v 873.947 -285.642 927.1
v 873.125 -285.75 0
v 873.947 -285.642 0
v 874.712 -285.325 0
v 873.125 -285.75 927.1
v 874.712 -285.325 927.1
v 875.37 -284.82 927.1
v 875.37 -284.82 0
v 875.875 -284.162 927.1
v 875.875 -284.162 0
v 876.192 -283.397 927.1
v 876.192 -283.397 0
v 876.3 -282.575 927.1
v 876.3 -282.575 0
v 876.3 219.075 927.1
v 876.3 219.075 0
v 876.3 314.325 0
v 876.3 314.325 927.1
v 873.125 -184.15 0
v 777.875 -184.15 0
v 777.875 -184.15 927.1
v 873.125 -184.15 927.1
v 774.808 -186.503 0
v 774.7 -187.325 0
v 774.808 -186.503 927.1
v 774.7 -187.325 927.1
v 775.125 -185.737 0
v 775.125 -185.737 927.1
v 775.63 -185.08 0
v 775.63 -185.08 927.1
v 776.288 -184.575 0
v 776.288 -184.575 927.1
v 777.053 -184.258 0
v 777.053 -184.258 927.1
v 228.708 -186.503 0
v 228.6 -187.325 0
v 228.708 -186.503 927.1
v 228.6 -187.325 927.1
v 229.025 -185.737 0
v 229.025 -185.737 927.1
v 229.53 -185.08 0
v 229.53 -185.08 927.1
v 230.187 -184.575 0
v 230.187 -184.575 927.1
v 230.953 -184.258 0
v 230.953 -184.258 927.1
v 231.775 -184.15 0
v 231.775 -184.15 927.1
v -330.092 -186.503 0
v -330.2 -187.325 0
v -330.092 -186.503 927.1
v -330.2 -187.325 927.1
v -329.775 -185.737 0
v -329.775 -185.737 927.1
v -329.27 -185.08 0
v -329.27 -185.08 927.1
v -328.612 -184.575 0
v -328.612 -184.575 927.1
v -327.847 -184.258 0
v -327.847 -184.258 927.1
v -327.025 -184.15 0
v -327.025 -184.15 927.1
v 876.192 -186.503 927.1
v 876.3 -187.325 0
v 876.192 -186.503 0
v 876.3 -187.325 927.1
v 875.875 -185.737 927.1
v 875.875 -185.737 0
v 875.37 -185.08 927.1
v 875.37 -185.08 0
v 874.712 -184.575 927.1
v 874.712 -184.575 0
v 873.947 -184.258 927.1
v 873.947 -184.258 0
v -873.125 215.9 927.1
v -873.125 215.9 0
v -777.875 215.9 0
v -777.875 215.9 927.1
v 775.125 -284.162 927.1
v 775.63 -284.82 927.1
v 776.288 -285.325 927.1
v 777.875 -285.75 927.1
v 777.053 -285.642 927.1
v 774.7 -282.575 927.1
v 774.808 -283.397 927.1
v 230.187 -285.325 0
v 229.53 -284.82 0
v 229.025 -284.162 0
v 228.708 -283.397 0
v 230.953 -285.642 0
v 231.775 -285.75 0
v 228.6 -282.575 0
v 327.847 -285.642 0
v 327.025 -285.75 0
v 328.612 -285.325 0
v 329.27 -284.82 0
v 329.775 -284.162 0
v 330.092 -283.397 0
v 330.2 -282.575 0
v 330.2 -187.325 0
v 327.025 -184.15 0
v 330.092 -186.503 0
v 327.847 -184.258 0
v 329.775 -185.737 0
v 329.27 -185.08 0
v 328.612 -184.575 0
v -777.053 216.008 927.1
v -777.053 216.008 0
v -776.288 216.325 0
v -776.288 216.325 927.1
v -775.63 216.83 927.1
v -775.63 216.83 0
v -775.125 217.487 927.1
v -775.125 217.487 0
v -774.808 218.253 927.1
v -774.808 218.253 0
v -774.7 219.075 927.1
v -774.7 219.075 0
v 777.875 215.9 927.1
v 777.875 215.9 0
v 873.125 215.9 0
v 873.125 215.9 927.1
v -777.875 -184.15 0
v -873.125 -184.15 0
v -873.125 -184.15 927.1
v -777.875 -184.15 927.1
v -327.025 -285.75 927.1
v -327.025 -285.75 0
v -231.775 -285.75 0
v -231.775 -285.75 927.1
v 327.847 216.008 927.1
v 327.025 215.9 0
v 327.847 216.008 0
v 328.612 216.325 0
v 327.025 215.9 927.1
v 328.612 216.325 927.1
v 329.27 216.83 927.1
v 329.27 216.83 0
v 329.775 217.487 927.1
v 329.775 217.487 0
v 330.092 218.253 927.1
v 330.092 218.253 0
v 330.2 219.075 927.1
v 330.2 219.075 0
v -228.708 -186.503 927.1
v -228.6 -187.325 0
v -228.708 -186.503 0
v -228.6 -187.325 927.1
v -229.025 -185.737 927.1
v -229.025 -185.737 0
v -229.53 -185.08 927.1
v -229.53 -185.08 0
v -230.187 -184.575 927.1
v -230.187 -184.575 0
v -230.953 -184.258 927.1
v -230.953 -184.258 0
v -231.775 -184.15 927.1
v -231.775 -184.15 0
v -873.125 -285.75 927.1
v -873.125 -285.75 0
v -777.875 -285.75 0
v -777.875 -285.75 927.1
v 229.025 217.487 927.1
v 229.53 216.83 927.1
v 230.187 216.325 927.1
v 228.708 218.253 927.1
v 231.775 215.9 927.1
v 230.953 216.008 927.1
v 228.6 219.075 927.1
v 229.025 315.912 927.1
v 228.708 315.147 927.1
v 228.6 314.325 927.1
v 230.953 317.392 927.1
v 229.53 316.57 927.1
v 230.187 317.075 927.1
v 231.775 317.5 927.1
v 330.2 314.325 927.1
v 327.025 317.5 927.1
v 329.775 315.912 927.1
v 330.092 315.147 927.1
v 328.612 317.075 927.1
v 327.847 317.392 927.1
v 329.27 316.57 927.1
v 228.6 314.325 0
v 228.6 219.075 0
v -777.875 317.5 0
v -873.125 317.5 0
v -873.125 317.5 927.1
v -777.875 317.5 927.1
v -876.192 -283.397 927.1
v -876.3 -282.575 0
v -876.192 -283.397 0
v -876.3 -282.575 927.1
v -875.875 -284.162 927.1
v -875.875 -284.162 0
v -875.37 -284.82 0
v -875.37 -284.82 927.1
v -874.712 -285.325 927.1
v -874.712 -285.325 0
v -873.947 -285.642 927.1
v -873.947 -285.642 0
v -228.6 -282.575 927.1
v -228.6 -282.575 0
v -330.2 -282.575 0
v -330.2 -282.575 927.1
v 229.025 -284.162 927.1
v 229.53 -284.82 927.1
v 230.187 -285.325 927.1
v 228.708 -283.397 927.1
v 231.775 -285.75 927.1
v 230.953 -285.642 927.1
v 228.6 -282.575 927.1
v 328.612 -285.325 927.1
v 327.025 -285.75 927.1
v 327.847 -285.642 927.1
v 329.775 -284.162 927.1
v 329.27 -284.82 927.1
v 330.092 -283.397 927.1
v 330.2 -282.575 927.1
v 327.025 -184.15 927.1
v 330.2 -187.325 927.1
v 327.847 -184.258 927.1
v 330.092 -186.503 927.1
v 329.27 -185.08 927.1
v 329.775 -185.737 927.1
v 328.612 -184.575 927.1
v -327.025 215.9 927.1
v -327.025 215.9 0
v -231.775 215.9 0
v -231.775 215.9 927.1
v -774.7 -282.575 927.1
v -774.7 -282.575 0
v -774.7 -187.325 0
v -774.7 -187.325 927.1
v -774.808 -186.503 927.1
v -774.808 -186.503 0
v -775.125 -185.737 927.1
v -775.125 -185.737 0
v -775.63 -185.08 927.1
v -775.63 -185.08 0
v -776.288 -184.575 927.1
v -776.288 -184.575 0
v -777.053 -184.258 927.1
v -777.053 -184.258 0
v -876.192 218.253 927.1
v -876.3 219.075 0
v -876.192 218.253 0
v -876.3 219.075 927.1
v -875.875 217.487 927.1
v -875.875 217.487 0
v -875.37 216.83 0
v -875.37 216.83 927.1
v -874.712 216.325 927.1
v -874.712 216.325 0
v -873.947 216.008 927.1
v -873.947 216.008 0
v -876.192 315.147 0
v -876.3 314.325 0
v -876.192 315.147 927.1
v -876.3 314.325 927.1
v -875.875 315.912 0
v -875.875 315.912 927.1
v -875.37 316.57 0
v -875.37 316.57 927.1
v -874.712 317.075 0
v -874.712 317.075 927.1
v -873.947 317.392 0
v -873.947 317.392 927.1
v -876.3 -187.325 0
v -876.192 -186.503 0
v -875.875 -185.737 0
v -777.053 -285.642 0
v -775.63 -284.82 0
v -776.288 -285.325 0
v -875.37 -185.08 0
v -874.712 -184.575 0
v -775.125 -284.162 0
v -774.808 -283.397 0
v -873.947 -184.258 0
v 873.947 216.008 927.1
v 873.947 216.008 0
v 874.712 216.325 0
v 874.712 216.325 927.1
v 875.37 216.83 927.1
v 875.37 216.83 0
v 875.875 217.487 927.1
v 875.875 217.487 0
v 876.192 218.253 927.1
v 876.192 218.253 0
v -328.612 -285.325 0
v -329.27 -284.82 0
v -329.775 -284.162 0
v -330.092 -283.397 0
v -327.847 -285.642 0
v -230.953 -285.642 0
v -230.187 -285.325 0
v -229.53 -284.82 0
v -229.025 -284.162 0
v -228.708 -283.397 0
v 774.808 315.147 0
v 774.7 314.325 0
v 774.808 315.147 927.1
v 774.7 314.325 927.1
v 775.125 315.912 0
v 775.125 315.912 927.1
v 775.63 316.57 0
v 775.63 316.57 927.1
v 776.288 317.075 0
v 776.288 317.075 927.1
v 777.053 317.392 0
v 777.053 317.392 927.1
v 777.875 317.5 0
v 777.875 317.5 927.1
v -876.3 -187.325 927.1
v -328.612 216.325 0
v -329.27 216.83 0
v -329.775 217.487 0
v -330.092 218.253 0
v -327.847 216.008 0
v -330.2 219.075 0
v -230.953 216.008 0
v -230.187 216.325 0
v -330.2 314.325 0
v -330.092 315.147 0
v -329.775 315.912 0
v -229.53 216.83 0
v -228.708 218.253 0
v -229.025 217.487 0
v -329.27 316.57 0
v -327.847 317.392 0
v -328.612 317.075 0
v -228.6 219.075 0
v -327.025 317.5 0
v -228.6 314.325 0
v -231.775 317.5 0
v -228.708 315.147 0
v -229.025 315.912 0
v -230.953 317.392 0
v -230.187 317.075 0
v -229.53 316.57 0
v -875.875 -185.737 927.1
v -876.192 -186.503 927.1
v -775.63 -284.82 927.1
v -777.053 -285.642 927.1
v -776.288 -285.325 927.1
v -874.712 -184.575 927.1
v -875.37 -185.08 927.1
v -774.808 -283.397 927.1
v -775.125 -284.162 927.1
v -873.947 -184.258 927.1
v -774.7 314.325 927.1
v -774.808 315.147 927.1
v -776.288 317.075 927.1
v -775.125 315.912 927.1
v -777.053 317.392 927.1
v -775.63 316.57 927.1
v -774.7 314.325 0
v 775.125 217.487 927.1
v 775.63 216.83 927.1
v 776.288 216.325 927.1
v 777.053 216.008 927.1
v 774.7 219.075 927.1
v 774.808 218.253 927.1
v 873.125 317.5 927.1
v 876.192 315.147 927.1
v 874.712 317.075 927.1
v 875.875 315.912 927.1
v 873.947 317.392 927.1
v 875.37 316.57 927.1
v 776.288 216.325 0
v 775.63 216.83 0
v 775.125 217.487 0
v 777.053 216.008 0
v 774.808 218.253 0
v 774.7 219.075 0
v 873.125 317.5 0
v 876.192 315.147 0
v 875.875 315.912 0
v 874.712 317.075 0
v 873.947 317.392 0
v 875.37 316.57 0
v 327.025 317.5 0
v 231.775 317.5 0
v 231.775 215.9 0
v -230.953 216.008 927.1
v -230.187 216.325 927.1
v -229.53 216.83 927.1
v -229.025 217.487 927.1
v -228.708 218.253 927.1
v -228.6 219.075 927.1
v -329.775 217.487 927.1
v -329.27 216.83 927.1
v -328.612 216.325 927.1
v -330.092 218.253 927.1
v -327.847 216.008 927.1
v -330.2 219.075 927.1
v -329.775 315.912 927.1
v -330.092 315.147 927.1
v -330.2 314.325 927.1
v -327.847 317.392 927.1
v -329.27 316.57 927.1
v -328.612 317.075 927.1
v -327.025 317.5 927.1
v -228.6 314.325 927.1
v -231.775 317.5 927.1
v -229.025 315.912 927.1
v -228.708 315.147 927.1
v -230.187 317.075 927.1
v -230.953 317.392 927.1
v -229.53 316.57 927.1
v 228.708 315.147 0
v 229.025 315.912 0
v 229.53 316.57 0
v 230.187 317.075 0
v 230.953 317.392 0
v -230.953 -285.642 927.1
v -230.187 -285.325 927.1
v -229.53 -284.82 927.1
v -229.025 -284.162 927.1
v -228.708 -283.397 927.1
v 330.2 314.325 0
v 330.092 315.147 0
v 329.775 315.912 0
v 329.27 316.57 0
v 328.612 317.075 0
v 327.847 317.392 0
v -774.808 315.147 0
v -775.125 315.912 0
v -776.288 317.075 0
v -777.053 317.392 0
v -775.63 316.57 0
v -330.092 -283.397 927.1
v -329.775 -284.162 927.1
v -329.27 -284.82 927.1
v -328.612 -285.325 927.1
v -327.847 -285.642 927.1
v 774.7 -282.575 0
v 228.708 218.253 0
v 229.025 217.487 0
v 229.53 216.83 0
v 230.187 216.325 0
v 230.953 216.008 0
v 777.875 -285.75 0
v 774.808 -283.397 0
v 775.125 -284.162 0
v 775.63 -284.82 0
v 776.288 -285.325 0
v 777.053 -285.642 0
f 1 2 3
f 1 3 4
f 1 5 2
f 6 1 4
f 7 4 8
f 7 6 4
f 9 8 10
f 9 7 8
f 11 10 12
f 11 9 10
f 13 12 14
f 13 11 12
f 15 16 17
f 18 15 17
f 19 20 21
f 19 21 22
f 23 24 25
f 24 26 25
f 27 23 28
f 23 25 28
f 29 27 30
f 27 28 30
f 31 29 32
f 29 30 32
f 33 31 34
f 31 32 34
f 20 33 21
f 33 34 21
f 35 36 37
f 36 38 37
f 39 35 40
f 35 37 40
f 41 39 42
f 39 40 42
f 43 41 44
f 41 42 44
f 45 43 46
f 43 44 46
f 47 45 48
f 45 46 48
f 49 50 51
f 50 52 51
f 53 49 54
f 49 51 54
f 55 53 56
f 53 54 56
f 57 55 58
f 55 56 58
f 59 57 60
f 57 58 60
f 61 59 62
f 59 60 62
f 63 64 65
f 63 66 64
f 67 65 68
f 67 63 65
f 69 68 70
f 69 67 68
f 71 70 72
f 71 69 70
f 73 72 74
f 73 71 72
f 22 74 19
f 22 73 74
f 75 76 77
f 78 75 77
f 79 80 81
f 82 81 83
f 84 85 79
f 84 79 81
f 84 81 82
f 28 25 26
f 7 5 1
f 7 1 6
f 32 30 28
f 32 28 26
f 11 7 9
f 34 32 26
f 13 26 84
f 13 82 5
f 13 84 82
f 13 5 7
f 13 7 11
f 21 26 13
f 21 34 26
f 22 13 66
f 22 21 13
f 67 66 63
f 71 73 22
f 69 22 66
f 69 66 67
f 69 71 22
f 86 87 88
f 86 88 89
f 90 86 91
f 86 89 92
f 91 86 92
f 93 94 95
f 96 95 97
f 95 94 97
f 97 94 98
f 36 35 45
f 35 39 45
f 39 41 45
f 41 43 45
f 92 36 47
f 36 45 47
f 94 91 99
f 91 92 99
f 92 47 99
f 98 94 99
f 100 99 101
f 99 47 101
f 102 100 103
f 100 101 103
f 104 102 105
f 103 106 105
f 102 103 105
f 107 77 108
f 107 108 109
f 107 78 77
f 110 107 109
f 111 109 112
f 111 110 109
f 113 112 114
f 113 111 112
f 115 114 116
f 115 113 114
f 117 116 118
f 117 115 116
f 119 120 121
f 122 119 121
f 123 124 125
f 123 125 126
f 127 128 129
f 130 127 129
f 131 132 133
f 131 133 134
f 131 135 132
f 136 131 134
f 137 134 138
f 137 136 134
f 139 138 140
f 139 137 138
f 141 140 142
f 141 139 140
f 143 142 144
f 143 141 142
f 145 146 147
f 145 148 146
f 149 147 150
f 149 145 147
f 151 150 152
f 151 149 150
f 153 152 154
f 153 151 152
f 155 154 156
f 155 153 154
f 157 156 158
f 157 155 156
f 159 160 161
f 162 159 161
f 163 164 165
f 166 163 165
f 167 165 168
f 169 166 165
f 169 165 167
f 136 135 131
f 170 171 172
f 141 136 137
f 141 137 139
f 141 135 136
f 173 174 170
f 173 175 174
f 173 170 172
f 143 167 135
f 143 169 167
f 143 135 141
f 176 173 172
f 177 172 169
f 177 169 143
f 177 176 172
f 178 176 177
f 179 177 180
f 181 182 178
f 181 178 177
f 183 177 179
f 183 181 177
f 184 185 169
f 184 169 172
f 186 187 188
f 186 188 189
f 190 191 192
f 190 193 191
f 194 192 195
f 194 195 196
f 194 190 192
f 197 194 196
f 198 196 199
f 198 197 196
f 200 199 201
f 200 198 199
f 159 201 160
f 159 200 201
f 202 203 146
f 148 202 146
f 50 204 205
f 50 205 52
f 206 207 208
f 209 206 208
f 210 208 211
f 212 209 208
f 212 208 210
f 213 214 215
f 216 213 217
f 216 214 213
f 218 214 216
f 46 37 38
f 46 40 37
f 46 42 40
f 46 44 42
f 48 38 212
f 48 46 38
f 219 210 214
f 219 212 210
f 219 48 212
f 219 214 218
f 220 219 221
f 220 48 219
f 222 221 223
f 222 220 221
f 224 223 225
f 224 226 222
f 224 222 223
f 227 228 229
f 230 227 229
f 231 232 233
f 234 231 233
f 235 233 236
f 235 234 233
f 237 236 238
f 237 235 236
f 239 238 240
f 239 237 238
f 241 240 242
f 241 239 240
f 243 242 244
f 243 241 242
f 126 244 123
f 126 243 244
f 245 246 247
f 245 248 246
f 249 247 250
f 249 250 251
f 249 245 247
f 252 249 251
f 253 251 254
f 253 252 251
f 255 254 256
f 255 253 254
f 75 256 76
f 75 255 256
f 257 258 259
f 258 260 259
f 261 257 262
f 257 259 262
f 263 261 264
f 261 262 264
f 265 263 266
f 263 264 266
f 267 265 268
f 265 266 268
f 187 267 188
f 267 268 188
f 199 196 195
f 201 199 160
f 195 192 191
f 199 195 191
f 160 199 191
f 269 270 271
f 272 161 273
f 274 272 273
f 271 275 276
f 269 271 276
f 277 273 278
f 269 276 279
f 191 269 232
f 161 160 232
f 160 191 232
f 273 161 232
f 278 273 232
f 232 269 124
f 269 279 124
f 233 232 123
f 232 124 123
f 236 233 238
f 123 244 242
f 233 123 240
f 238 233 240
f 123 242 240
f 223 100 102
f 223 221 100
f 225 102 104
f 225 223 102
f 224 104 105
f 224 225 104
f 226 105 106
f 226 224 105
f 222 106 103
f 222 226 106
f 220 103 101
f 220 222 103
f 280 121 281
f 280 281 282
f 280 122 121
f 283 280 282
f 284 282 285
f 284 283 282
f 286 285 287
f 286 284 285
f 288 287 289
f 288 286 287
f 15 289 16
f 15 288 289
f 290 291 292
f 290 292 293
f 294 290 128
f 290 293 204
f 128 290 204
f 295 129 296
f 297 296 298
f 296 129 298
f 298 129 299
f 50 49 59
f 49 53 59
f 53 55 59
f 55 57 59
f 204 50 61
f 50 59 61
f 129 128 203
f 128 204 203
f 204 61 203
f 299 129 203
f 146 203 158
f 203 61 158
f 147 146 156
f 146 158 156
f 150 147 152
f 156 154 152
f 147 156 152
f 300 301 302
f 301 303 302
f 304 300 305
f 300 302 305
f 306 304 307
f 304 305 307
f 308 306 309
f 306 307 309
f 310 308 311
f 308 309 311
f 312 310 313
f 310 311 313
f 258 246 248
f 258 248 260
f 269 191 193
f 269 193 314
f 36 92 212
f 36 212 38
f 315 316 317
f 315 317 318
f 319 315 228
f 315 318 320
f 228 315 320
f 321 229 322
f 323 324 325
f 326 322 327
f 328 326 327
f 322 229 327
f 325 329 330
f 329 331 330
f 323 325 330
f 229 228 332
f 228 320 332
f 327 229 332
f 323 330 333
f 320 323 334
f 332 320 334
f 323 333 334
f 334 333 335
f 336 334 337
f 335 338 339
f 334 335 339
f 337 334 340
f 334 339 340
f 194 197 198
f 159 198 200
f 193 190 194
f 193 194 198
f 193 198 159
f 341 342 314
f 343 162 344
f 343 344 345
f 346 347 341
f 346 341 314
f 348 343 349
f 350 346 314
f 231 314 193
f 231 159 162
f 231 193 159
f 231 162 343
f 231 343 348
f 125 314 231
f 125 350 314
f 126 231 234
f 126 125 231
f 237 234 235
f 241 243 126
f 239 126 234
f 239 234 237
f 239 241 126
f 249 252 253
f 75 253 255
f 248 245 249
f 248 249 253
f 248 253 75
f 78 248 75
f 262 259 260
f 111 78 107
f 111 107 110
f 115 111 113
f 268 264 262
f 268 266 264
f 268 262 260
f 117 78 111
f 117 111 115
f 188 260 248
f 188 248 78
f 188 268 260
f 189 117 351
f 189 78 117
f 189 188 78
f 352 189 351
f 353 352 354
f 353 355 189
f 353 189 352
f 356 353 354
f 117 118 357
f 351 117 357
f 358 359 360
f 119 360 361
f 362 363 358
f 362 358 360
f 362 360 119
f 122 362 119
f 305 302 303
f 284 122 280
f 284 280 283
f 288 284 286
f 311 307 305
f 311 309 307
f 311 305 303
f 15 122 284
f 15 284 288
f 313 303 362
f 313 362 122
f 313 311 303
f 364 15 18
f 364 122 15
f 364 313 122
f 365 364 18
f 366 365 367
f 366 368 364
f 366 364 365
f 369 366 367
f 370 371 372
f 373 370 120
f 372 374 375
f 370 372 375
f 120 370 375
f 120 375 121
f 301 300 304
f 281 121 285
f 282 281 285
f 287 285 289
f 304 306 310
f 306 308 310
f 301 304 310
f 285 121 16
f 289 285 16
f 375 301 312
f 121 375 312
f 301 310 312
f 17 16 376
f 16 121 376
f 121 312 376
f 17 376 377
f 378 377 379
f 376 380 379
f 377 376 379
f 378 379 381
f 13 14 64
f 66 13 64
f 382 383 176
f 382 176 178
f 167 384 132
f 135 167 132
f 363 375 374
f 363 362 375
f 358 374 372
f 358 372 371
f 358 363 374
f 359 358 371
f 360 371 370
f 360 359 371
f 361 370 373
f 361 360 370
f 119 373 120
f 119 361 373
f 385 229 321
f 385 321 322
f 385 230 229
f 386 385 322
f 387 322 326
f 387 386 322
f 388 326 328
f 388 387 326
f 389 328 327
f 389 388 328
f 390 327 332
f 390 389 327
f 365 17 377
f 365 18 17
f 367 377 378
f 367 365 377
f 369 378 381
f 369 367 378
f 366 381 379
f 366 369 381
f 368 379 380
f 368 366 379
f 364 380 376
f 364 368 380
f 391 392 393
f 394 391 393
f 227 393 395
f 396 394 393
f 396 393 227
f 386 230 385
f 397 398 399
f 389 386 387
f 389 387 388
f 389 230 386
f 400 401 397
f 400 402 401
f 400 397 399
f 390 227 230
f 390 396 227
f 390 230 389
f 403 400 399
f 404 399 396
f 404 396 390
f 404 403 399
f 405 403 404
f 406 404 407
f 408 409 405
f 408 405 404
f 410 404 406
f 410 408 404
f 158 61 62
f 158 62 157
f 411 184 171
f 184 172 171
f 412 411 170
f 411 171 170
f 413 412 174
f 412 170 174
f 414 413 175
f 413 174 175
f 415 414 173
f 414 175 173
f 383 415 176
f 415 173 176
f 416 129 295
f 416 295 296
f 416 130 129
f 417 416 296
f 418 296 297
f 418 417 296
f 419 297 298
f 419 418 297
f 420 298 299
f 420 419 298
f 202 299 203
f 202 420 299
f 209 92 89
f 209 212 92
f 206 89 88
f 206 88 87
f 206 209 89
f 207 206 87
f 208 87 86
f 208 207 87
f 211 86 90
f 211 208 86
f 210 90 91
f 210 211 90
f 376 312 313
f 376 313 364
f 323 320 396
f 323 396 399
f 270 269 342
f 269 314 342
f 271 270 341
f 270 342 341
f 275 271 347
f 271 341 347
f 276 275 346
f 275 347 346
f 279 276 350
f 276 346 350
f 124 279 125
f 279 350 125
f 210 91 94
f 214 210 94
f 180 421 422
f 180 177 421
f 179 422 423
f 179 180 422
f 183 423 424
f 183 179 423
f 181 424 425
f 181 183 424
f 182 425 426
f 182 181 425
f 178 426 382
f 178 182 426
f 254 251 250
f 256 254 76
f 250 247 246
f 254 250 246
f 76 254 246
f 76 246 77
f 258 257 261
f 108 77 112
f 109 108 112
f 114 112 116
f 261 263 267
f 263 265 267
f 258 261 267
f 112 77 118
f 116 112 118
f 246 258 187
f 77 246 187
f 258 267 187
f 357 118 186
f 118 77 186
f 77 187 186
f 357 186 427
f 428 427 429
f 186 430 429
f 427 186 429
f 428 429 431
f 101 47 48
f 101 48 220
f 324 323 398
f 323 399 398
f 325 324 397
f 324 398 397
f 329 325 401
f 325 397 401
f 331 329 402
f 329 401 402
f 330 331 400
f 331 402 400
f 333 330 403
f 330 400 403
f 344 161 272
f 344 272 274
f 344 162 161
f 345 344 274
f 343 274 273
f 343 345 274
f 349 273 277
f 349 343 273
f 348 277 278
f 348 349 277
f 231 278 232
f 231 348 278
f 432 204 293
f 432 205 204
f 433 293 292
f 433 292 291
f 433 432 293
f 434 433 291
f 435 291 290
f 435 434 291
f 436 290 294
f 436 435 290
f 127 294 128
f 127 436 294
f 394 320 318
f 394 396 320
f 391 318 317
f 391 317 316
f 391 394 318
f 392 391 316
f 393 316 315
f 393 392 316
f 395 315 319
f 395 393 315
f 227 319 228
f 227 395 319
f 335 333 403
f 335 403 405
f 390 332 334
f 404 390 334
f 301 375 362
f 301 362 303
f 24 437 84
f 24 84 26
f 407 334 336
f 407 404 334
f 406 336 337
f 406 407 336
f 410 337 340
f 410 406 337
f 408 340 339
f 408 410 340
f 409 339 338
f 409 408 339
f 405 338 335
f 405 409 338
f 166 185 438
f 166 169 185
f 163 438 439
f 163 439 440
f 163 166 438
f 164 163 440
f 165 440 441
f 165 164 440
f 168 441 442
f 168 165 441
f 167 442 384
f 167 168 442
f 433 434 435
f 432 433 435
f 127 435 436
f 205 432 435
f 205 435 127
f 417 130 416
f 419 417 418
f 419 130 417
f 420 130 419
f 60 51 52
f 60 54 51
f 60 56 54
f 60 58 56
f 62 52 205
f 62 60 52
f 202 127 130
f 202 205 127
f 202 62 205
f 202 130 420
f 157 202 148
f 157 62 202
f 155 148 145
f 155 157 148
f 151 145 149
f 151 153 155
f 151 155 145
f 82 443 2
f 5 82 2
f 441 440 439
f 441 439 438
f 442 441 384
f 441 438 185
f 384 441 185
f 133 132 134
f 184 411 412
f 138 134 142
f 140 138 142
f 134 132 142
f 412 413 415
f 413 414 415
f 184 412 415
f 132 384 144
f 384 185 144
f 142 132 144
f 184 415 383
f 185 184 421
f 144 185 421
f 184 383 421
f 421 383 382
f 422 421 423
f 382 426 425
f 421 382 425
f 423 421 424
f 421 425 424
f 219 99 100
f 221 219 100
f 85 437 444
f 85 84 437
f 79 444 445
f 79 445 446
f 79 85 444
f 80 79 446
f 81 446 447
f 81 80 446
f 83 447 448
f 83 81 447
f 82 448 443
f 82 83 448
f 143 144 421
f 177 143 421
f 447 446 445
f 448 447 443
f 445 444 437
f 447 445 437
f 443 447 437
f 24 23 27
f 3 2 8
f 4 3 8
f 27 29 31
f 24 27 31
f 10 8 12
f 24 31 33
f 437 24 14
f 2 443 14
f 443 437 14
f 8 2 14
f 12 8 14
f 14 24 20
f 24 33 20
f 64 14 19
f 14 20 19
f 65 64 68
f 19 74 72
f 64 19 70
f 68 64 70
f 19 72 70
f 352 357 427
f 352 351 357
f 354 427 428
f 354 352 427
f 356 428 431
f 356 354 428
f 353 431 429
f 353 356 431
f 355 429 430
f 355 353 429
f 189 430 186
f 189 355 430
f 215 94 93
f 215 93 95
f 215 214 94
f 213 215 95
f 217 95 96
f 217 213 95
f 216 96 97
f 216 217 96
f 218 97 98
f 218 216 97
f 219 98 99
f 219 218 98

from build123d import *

# Parameters (mm, degrees)
F0_W     = 101.6
F0_H     = 101.6
F1_DEPTH = 927.1
F2_R     = 3.175


with BuildPart() as f1:
    # F0 (on Top) → F1 (new body)
    with BuildSketch(Plane.XY):
        with Locations((825.5, 266.7)):
            Rectangle(F0_W, F0_H)
        with Locations((279.4, 266.7)):
            Rectangle(F0_W, F0_H)
        with Locations((-279.4, 266.7)):
            Rectangle(F0_W, F0_H)
        with Locations((-825.5, 266.7)):
            Rectangle(F0_W, F0_H)
        with Locations((-825.5, -234.95)):
            Rectangle(F0_W, F0_H)
        with Locations((825.5, -234.95)):
            Rectangle(F0_W, F0_H)
        with Locations((279.4, -234.95)):
            Rectangle(F0_W, F0_H)
        with Locations((-279.4, -234.95)):
            Rectangle(F0_W, F0_H)
    extrude(amount=F1_DEPTH)

    # F2
    f2_edges = [f1.edges().sort_by_distance(p)[0] for p in [
        (-876.3, -285.75, 463.55),
        (-774.7, -285.75, 463.55),
        (-774.7, -184.15, 463.55),
        (-876.3, 215.9, 463.55),
        (-774.7, 215.9, 463.55),
        (-774.7, 317.5, 463.55),
        (-330.2, -285.75, 463.55),
        (-228.6, -285.75, 463.55),
        (-228.6, -184.15, 463.55),
        (-330.2, 215.9, 463.55),
        (-228.6, 215.9, 463.55),
        (-228.6, 317.5, 463.55),
        (228.6, -285.75, 463.55),
        (330.2, -184.15, 463.55),
        (228.6, 215.9, 463.55),
        (330.2, 215.9, 463.55),
        (330.2, 317.5, 463.55),
        (876.3, -285.75, 463.55),
        (774.7, -285.75, 463.55),
        (876.3, -184.15, 463.55),
        (774.7, 215.9, 463.55),
        (876.3, 317.5, 463.55),
        (876.3, 215.9, 463.55),
        (774.7, -184.15, 463.55),
        (330.2, -285.75, 463.55),
        (774.7, 317.5, 463.55),
        (228.6, -184.15, 463.55),
        (228.6, 317.5, 463.55),
        (-330.2, -184.15, 463.55),
        (-330.2, 317.5, 463.55),
        (-876.3, -184.15, 463.55),
        (-876.3, 317.5, 463.55),
    ]]
    fillet(f2_edges, radius=F2_R)


solid = f1.part
